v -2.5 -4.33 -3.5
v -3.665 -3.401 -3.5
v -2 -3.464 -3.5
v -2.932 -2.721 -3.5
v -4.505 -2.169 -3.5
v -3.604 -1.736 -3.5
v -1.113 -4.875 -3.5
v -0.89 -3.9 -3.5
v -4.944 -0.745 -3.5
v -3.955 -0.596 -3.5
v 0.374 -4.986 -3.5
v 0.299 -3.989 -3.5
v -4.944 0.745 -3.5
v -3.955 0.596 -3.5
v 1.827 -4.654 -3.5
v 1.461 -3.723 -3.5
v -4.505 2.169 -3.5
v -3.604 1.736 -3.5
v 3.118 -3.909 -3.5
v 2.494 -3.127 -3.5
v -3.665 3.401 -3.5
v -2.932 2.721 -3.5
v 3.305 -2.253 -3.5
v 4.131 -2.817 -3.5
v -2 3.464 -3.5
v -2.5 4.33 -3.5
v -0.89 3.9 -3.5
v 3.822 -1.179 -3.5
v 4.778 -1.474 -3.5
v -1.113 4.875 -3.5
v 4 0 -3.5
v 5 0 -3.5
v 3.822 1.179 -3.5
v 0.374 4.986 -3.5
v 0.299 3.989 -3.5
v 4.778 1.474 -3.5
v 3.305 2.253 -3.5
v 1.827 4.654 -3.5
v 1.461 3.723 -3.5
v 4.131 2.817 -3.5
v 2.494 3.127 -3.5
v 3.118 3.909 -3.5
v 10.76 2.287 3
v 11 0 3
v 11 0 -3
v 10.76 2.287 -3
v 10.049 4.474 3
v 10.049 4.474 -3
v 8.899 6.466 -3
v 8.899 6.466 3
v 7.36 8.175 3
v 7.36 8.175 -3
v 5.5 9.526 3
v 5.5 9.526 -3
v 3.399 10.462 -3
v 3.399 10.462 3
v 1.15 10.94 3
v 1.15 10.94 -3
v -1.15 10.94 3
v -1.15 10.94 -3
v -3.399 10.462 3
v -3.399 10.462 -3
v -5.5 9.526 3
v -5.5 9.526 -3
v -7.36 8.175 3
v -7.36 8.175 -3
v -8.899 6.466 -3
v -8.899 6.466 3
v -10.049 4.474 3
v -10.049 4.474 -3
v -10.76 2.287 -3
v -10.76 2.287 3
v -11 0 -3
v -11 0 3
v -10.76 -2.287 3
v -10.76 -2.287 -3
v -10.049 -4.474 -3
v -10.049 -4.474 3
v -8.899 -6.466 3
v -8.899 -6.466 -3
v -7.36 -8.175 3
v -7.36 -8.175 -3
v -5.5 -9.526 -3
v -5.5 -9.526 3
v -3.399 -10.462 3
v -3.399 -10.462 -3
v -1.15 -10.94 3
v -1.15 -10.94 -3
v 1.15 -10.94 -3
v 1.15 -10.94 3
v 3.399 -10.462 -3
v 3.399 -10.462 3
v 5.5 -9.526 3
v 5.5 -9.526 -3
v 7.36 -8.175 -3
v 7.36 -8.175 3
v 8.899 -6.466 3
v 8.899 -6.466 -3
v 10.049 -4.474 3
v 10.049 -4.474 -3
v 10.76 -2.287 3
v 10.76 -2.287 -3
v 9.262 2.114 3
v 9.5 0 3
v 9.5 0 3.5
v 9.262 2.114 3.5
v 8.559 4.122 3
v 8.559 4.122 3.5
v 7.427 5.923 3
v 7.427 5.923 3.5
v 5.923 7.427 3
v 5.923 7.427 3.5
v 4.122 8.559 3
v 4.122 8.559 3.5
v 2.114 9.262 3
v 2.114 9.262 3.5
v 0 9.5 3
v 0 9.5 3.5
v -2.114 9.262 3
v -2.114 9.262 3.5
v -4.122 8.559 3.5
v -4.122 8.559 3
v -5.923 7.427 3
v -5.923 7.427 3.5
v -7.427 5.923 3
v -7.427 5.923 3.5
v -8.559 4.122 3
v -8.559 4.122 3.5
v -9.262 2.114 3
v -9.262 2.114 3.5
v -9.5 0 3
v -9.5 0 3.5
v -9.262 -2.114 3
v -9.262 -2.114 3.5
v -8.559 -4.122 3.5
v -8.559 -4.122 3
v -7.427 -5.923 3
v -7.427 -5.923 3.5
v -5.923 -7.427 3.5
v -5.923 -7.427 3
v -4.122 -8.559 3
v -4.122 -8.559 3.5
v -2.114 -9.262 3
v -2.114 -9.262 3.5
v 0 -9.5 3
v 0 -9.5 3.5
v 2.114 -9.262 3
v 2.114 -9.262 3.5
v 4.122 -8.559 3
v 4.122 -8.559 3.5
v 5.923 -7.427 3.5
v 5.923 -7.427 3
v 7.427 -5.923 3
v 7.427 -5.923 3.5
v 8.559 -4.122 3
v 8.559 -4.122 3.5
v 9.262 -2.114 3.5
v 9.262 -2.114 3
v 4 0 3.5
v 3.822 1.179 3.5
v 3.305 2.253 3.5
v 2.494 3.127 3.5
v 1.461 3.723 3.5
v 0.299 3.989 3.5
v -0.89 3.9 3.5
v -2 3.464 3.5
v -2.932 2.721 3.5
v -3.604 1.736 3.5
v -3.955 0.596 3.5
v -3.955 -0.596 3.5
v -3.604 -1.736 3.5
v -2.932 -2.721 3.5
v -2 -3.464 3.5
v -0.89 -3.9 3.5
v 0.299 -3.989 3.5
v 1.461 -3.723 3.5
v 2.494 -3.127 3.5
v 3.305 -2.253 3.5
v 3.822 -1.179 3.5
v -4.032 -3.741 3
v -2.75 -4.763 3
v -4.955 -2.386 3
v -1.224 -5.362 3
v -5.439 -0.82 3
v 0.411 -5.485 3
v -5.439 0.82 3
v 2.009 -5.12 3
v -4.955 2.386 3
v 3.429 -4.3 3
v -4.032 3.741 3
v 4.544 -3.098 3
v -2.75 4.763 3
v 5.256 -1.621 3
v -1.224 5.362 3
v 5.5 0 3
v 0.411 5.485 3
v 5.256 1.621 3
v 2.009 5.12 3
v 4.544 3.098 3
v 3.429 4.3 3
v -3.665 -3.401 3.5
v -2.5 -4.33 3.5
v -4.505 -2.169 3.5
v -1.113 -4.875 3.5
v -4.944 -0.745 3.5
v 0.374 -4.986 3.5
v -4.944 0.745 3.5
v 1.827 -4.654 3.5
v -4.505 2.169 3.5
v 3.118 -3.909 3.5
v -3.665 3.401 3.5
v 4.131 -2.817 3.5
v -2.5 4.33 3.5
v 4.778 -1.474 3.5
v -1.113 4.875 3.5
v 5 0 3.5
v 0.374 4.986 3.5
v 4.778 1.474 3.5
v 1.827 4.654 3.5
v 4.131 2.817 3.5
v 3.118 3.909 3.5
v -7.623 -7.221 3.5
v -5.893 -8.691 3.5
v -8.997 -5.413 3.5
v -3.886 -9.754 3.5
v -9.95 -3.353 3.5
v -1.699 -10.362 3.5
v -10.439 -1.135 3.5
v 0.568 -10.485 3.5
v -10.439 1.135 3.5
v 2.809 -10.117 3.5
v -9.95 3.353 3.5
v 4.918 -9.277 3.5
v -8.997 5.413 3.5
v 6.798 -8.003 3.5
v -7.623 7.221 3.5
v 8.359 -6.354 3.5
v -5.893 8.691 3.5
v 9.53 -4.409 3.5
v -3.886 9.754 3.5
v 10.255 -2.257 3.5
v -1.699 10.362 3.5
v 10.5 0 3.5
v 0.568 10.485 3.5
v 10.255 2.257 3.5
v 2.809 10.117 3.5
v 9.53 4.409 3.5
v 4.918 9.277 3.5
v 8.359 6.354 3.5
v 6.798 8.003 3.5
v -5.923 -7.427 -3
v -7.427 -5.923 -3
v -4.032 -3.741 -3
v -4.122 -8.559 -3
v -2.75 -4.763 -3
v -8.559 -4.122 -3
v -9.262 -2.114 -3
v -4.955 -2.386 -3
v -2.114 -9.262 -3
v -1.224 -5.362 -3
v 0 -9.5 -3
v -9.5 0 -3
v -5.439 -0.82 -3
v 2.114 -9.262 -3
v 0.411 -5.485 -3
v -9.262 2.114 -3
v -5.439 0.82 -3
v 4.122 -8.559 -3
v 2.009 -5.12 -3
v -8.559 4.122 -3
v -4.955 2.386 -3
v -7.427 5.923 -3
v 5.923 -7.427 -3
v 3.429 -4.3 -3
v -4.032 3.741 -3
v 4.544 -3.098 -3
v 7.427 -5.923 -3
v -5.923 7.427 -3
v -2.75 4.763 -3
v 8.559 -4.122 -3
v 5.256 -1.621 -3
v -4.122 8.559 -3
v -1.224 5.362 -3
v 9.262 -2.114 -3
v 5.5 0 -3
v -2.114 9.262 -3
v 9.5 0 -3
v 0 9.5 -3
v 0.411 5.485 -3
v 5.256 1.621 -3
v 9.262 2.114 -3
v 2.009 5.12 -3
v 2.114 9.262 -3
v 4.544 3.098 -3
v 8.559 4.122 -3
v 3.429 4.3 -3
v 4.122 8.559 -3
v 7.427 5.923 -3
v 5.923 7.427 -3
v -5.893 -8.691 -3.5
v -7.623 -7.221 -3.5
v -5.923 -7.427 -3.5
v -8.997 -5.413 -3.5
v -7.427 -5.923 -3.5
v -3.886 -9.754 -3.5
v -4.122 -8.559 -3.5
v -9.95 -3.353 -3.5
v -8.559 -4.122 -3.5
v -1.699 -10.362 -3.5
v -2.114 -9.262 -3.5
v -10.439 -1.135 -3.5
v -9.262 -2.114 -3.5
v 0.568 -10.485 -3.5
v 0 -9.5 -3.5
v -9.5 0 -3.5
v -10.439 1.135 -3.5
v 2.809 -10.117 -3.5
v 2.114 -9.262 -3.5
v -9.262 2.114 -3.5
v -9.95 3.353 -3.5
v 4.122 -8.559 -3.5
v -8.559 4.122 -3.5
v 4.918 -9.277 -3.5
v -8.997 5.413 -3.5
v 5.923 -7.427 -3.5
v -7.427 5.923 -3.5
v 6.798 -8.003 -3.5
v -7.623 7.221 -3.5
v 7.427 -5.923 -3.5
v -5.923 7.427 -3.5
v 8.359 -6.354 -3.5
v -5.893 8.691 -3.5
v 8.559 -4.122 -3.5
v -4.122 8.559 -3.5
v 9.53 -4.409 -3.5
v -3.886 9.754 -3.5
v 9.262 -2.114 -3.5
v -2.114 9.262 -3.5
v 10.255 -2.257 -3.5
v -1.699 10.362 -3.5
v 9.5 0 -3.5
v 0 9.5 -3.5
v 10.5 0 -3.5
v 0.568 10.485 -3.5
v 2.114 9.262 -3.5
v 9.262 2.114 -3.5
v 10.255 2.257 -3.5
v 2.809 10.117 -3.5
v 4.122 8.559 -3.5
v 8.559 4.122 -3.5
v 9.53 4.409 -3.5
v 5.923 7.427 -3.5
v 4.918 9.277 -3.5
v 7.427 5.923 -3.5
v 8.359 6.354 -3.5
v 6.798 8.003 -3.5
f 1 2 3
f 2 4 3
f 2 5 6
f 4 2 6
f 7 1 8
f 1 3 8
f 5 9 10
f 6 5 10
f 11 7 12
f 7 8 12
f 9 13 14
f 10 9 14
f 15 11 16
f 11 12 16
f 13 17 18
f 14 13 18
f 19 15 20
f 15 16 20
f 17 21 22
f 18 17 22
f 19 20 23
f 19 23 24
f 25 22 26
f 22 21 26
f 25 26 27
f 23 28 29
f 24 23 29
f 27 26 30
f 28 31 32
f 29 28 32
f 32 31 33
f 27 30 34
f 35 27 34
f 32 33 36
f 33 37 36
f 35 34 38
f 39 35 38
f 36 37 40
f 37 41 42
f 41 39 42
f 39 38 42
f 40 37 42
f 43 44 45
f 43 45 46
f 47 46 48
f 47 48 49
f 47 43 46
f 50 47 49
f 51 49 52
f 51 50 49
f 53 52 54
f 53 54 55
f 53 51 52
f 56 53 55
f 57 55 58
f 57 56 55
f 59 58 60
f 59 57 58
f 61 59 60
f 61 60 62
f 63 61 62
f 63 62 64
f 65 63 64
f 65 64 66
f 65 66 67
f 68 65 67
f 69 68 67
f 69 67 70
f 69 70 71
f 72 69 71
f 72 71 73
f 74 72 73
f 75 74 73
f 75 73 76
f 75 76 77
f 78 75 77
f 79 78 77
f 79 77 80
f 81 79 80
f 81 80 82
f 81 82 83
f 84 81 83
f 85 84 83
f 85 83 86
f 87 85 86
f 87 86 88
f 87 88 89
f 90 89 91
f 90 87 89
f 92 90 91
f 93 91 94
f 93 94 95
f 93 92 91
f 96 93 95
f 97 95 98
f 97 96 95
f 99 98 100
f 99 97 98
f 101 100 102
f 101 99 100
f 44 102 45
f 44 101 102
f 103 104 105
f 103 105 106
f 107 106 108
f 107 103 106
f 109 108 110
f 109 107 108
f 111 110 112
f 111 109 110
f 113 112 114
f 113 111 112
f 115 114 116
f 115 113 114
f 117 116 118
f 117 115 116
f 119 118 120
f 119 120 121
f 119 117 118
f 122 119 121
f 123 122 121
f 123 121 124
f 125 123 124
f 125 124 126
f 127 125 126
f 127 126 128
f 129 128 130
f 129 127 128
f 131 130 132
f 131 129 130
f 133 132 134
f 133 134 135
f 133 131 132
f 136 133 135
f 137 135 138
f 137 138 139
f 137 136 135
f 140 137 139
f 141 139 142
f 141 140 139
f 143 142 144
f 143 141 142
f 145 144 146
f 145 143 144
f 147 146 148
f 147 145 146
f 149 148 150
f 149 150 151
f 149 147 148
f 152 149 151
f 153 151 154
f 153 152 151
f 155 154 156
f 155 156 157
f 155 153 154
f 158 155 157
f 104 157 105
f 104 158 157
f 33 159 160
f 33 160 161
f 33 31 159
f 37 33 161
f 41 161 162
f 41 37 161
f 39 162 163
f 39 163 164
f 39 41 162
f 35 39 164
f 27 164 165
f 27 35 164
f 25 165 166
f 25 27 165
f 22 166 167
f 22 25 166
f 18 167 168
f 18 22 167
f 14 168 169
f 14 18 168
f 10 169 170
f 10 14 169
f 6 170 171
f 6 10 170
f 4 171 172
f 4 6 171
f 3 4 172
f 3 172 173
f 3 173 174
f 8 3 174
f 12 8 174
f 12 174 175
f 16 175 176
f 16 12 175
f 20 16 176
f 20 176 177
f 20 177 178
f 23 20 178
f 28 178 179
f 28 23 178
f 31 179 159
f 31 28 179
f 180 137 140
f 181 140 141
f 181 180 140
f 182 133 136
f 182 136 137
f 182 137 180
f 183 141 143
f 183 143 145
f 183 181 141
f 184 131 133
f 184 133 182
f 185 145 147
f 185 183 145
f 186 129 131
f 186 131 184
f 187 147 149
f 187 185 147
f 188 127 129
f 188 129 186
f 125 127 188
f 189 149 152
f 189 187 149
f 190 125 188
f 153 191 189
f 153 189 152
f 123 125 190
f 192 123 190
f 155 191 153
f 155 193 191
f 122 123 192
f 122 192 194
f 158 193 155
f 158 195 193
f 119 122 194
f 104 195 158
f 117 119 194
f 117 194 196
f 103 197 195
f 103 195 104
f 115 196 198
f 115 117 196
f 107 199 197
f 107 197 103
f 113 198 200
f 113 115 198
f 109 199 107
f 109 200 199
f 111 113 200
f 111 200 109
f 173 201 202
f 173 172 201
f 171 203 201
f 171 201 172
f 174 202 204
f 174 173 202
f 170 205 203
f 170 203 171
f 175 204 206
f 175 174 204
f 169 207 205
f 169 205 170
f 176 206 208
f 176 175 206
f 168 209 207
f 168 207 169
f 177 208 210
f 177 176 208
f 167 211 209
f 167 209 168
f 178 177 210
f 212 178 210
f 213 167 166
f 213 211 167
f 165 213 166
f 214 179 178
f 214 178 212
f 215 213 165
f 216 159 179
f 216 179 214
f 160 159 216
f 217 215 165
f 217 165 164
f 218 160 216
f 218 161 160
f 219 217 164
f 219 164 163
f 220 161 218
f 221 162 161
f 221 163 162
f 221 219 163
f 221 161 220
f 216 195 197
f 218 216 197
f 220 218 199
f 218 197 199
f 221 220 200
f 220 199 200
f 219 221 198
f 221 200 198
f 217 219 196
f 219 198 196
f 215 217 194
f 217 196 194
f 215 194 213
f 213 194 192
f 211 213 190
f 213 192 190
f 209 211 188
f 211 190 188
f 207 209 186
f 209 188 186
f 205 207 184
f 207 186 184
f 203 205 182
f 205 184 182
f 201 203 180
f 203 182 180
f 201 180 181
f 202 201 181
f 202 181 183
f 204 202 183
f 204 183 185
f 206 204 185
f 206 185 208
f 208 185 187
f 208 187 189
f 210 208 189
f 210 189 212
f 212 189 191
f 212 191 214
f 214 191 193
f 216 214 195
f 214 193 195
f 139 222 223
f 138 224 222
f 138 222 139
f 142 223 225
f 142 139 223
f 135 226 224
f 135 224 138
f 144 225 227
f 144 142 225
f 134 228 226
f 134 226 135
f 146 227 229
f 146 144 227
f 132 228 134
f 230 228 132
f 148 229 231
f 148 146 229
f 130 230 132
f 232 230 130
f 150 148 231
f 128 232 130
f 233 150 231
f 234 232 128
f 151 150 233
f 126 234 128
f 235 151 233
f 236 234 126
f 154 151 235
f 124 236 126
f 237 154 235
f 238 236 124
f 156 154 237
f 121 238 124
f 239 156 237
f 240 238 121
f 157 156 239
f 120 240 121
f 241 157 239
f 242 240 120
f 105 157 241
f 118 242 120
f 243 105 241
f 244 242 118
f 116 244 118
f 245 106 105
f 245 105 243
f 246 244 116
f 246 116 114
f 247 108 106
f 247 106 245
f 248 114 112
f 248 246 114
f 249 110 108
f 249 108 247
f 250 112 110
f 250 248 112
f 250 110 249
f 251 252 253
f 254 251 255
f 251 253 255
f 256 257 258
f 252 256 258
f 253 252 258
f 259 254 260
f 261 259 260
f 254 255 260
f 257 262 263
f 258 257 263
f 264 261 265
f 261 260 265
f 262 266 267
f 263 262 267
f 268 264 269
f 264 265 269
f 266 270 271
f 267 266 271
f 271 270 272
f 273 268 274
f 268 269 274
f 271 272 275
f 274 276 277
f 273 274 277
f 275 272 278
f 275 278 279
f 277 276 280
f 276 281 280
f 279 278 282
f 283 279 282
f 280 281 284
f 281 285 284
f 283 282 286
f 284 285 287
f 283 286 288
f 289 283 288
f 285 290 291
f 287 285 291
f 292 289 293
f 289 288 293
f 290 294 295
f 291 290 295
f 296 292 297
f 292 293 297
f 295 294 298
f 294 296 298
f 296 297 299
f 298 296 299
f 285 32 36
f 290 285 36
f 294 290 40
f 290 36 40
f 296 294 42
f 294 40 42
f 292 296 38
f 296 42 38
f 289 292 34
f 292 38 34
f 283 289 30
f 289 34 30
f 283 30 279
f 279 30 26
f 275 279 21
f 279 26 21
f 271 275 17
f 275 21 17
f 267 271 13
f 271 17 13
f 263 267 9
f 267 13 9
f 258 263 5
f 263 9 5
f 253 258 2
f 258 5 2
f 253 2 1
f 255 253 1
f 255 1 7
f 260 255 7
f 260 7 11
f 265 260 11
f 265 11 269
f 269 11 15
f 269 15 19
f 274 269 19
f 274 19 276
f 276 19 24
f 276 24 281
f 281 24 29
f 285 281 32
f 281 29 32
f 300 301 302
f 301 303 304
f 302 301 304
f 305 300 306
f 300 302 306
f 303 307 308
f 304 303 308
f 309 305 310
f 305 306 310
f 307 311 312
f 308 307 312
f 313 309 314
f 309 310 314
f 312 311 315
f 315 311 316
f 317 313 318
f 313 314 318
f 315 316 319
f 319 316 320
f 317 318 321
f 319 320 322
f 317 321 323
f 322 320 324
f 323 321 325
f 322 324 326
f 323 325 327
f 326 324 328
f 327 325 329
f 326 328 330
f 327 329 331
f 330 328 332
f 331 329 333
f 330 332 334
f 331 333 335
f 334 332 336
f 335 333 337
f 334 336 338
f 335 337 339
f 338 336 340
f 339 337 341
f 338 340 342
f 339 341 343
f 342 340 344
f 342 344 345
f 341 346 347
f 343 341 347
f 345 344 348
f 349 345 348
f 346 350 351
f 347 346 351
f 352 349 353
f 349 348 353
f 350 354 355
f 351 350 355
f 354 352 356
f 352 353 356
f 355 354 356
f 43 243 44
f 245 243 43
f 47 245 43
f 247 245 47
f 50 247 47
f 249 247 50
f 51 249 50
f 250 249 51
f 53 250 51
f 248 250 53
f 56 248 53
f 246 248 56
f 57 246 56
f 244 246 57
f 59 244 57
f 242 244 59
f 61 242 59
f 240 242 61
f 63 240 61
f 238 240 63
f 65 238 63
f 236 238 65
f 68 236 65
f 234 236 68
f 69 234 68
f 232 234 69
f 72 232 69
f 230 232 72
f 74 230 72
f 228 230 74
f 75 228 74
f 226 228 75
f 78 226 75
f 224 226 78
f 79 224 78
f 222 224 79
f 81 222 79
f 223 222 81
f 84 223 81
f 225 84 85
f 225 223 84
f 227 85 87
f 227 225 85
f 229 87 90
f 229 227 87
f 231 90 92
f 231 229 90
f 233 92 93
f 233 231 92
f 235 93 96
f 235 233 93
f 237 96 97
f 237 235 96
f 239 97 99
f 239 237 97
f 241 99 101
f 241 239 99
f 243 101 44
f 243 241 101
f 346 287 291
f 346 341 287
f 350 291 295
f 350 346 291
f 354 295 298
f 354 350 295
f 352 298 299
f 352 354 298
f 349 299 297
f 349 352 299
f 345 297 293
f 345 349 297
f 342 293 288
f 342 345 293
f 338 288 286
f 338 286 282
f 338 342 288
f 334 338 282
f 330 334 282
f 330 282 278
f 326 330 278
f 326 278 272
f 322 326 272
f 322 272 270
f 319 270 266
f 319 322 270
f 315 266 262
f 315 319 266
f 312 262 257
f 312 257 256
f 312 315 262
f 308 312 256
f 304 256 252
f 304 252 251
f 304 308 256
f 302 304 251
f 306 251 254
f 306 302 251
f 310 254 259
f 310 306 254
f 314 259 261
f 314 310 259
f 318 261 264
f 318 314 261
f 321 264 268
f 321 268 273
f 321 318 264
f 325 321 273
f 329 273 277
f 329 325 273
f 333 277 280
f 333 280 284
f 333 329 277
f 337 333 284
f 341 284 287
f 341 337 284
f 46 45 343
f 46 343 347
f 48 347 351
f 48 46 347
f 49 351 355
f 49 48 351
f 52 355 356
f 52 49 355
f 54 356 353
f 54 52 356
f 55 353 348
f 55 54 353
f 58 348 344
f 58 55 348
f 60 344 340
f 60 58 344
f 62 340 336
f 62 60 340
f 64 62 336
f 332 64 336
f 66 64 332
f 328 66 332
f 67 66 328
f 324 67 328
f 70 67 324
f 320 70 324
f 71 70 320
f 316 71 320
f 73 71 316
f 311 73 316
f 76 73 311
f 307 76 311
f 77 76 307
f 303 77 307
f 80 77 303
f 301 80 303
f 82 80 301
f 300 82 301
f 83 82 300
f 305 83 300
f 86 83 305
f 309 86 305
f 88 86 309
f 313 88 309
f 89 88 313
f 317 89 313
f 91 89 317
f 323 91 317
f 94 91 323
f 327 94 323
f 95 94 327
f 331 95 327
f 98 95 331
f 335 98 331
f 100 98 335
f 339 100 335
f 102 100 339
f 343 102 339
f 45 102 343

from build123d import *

# Parameters (mm, degrees)
SKETCH1_R             = 11
SKETCH1_R_2           = 9.5
BOSS_EXTRUDE1_DEPTH   = 3.5
SKETCH1_R_3           = 5.5
SKETCH1_R_4           = 4
BOSS_EXTRUDE1_2_DEPTH = 3.5
SKETCH1_3_R           = 9.5
SKETCH1_3_R_2         = 5.5
BOSS_EXTRUDE2_DEPTH   = 3
CHAMFER1_SIZE         = 0.5


with BuildPart() as part:
    # Sketch1 → Boss-Extrude1 (new, symmetric)
    with BuildSketch(Plane.XY):
        Circle(SKETCH1_R)
        Circle(SKETCH1_R_2, mode=Mode.SUBTRACT)
    extrude(amount=BOSS_EXTRUDE1_DEPTH, both=True)



with BuildPart() as body_2:
    # Sketch1 → Boss-Extrude1 2 (new, symmetric)
    with BuildSketch(Plane.XY):
        Circle(SKETCH1_R_3)
        Circle(SKETCH1_R_4, mode=Mode.SUBTRACT)
    extrude(amount=BOSS_EXTRUDE1_2_DEPTH, both=True)


with BuildPart() as part_1:
    add(part.part)

    add(body_2.part)  # Boss-Extrude2 merges body 2
    # Sketch1<3> → Boss-Extrude2 (add, symmetric)
    with BuildSketch(Plane.XY):
        Circle(SKETCH1_3_R)
        Circle(SKETCH1_3_R_2, mode=Mode.SUBTRACT)
    extrude(amount=BOSS_EXTRUDE2_DEPTH, both=True)

    # Chamfer1
    chamfer1_edges = [part_1.edges().sort_by_distance(p)[0] for p in [
        (-5.5, 0, -3.5),
        (-5.5, 0, 3.5),
        (-11, 0, -3.5),
        (-11, 0, 3.5),
    ]]
    chamfer(chamfer1_edges, length=CHAMFER1_SIZE - 0.0001)  # a hair under: the kernel refuses the full size


solid = part_1.part
